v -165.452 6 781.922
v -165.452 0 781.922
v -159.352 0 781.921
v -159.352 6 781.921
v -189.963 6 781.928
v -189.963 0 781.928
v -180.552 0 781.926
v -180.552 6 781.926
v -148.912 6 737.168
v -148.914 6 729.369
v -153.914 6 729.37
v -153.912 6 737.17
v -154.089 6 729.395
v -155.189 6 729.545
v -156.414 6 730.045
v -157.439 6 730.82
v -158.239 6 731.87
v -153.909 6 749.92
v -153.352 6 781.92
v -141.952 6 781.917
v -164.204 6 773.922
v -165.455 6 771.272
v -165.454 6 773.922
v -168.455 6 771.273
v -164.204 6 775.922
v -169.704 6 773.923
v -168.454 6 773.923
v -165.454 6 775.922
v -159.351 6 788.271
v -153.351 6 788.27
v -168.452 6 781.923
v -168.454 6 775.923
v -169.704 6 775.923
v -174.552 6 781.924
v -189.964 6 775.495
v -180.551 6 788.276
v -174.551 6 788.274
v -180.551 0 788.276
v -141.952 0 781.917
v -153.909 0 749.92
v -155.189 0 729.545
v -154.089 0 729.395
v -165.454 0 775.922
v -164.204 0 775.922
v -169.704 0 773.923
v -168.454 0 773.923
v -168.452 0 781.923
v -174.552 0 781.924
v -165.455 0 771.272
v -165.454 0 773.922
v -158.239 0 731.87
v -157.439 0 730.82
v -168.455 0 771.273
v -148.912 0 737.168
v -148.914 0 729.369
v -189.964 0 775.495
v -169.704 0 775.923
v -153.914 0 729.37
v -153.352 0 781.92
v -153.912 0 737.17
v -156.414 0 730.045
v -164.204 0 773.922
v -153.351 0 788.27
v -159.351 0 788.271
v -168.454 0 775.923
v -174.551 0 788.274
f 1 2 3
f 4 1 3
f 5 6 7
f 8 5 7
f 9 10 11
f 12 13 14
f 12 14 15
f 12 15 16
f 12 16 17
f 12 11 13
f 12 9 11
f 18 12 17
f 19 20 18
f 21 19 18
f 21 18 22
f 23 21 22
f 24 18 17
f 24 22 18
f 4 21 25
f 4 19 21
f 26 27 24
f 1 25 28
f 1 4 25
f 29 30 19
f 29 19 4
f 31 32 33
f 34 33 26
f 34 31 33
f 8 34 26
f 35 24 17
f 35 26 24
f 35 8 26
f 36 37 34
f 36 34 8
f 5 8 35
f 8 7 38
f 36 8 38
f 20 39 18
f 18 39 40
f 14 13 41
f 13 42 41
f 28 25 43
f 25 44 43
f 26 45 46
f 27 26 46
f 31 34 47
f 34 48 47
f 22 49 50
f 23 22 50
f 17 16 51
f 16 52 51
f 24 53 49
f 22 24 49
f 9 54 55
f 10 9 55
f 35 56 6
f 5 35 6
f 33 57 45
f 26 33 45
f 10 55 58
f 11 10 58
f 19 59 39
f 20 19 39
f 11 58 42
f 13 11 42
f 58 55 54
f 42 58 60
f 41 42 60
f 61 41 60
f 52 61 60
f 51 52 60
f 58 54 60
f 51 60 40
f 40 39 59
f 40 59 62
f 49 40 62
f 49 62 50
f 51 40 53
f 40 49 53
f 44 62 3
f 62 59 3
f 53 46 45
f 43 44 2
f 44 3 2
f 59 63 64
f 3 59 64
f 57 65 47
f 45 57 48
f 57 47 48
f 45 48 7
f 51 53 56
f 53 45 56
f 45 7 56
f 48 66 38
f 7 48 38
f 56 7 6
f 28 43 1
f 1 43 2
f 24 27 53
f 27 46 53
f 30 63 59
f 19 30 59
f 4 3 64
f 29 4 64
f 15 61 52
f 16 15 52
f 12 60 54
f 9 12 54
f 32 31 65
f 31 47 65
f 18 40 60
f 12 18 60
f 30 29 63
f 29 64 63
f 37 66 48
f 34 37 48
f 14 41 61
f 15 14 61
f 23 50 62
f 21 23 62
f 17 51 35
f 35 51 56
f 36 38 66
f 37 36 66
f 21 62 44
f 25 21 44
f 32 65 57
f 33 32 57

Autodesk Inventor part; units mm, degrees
ref_plane "YZ Plane" through (0, 0, 0) normal (1, 0, 0) x (0, 1, 0)
ref_plane "XZ Plane" through (0, 0, 0) normal (0, 1, 0) x (-1, 0, 0)
ref_plane "XY Plane" through (0, 0, 0) normal (0, 0, 1) x (1, 0, 0)
sketch "Sketch1" plane through (0, 0, 0) normal (0, 1, 0) x (-1, 0, 0)
  line L0 (180.5524, 781.9255) -> (180.551, 788.2755)
  line L1 (180.551, 788.2755) -> (174.551, 788.2742)
  line L2 (174.551, 788.2742) -> (174.5524, 781.9242)
  line L3 (174.5524, 781.9242) -> (168.4524, 781.9229)
  line L4 (168.4524, 781.9229) -> (168.4537, 775.9228)
  line L5 (168.4537, 775.9228) -> (169.7037, 775.9231)
  line L6 (169.7037, 775.9231) -> (169.7042, 773.9231)
  line L7 (169.7042, 773.9231) -> (168.4542, 773.9229)
  line L8 (168.4542, 773.9229) -> (168.4547, 771.2728)
  line L9 (168.4547, 771.2728) -> (165.4547, 771.2722)
  line L10 (165.4547, 771.2722) -> (165.4541, 773.9222)
  line L11 (165.4541, 773.9222) -> (164.2041, 773.9219)
  line L12 (164.2041, 773.9219) -> (164.2037, 775.9219)
  line L13 (164.2037, 775.9219) -> (165.4537, 775.9222)
  line L14 (165.4537, 775.9222) -> (165.4524, 781.9222)
  line L15 (165.4524, 781.9222) -> (159.3524, 781.9209)
  line L16 (159.3524, 781.9209) -> (159.351, 788.2709)
  line L17 (159.351, 788.2709) -> (153.351, 788.2696)
  line L18 (153.351, 788.2696) -> (153.3524, 781.9196)
  line L19 (153.3524, 781.9196) -> (141.9524, 781.9171)
  line L20 (141.9524, 781.9171) -> (153.9094, 749.9197)
  line L21 (153.9094, 749.9197) -> (153.9122, 737.1696)
  line L22 (153.9122, 737.1696) -> (148.9122, 737.1685)
  line L23 (148.9122, 737.1685) -> (148.9139, 729.3686)
  line L24 (148.9139, 729.3686) -> (153.9139, 729.3697)
  line L25 (153.9139, 729.3697) -> (154.0889, 729.3947)
  line L26 (154.0889, 729.3947) -> (155.1888, 729.545)
  line L27 (155.1888, 729.545) -> (156.4138, 730.0452)
  line L28 (156.4138, 730.0452) -> (157.4386, 730.8204)
  line L29 (157.4386, 730.8204) -> (158.2386, 731.8705)
  line L30 (158.2386, 731.8705) -> (189.9642, 775.495)
  line L31 (189.9642, 775.495) -> (189.9628, 781.9276)
  line L32 (189.9628, 781.9276) -> (180.5524, 781.9255)
  point P0 (0, 0)
extrude "Extrusion1" add sketch "Sketch1" along normal blind 6
properties part number "Z Motor Mount Brace_CPY"
